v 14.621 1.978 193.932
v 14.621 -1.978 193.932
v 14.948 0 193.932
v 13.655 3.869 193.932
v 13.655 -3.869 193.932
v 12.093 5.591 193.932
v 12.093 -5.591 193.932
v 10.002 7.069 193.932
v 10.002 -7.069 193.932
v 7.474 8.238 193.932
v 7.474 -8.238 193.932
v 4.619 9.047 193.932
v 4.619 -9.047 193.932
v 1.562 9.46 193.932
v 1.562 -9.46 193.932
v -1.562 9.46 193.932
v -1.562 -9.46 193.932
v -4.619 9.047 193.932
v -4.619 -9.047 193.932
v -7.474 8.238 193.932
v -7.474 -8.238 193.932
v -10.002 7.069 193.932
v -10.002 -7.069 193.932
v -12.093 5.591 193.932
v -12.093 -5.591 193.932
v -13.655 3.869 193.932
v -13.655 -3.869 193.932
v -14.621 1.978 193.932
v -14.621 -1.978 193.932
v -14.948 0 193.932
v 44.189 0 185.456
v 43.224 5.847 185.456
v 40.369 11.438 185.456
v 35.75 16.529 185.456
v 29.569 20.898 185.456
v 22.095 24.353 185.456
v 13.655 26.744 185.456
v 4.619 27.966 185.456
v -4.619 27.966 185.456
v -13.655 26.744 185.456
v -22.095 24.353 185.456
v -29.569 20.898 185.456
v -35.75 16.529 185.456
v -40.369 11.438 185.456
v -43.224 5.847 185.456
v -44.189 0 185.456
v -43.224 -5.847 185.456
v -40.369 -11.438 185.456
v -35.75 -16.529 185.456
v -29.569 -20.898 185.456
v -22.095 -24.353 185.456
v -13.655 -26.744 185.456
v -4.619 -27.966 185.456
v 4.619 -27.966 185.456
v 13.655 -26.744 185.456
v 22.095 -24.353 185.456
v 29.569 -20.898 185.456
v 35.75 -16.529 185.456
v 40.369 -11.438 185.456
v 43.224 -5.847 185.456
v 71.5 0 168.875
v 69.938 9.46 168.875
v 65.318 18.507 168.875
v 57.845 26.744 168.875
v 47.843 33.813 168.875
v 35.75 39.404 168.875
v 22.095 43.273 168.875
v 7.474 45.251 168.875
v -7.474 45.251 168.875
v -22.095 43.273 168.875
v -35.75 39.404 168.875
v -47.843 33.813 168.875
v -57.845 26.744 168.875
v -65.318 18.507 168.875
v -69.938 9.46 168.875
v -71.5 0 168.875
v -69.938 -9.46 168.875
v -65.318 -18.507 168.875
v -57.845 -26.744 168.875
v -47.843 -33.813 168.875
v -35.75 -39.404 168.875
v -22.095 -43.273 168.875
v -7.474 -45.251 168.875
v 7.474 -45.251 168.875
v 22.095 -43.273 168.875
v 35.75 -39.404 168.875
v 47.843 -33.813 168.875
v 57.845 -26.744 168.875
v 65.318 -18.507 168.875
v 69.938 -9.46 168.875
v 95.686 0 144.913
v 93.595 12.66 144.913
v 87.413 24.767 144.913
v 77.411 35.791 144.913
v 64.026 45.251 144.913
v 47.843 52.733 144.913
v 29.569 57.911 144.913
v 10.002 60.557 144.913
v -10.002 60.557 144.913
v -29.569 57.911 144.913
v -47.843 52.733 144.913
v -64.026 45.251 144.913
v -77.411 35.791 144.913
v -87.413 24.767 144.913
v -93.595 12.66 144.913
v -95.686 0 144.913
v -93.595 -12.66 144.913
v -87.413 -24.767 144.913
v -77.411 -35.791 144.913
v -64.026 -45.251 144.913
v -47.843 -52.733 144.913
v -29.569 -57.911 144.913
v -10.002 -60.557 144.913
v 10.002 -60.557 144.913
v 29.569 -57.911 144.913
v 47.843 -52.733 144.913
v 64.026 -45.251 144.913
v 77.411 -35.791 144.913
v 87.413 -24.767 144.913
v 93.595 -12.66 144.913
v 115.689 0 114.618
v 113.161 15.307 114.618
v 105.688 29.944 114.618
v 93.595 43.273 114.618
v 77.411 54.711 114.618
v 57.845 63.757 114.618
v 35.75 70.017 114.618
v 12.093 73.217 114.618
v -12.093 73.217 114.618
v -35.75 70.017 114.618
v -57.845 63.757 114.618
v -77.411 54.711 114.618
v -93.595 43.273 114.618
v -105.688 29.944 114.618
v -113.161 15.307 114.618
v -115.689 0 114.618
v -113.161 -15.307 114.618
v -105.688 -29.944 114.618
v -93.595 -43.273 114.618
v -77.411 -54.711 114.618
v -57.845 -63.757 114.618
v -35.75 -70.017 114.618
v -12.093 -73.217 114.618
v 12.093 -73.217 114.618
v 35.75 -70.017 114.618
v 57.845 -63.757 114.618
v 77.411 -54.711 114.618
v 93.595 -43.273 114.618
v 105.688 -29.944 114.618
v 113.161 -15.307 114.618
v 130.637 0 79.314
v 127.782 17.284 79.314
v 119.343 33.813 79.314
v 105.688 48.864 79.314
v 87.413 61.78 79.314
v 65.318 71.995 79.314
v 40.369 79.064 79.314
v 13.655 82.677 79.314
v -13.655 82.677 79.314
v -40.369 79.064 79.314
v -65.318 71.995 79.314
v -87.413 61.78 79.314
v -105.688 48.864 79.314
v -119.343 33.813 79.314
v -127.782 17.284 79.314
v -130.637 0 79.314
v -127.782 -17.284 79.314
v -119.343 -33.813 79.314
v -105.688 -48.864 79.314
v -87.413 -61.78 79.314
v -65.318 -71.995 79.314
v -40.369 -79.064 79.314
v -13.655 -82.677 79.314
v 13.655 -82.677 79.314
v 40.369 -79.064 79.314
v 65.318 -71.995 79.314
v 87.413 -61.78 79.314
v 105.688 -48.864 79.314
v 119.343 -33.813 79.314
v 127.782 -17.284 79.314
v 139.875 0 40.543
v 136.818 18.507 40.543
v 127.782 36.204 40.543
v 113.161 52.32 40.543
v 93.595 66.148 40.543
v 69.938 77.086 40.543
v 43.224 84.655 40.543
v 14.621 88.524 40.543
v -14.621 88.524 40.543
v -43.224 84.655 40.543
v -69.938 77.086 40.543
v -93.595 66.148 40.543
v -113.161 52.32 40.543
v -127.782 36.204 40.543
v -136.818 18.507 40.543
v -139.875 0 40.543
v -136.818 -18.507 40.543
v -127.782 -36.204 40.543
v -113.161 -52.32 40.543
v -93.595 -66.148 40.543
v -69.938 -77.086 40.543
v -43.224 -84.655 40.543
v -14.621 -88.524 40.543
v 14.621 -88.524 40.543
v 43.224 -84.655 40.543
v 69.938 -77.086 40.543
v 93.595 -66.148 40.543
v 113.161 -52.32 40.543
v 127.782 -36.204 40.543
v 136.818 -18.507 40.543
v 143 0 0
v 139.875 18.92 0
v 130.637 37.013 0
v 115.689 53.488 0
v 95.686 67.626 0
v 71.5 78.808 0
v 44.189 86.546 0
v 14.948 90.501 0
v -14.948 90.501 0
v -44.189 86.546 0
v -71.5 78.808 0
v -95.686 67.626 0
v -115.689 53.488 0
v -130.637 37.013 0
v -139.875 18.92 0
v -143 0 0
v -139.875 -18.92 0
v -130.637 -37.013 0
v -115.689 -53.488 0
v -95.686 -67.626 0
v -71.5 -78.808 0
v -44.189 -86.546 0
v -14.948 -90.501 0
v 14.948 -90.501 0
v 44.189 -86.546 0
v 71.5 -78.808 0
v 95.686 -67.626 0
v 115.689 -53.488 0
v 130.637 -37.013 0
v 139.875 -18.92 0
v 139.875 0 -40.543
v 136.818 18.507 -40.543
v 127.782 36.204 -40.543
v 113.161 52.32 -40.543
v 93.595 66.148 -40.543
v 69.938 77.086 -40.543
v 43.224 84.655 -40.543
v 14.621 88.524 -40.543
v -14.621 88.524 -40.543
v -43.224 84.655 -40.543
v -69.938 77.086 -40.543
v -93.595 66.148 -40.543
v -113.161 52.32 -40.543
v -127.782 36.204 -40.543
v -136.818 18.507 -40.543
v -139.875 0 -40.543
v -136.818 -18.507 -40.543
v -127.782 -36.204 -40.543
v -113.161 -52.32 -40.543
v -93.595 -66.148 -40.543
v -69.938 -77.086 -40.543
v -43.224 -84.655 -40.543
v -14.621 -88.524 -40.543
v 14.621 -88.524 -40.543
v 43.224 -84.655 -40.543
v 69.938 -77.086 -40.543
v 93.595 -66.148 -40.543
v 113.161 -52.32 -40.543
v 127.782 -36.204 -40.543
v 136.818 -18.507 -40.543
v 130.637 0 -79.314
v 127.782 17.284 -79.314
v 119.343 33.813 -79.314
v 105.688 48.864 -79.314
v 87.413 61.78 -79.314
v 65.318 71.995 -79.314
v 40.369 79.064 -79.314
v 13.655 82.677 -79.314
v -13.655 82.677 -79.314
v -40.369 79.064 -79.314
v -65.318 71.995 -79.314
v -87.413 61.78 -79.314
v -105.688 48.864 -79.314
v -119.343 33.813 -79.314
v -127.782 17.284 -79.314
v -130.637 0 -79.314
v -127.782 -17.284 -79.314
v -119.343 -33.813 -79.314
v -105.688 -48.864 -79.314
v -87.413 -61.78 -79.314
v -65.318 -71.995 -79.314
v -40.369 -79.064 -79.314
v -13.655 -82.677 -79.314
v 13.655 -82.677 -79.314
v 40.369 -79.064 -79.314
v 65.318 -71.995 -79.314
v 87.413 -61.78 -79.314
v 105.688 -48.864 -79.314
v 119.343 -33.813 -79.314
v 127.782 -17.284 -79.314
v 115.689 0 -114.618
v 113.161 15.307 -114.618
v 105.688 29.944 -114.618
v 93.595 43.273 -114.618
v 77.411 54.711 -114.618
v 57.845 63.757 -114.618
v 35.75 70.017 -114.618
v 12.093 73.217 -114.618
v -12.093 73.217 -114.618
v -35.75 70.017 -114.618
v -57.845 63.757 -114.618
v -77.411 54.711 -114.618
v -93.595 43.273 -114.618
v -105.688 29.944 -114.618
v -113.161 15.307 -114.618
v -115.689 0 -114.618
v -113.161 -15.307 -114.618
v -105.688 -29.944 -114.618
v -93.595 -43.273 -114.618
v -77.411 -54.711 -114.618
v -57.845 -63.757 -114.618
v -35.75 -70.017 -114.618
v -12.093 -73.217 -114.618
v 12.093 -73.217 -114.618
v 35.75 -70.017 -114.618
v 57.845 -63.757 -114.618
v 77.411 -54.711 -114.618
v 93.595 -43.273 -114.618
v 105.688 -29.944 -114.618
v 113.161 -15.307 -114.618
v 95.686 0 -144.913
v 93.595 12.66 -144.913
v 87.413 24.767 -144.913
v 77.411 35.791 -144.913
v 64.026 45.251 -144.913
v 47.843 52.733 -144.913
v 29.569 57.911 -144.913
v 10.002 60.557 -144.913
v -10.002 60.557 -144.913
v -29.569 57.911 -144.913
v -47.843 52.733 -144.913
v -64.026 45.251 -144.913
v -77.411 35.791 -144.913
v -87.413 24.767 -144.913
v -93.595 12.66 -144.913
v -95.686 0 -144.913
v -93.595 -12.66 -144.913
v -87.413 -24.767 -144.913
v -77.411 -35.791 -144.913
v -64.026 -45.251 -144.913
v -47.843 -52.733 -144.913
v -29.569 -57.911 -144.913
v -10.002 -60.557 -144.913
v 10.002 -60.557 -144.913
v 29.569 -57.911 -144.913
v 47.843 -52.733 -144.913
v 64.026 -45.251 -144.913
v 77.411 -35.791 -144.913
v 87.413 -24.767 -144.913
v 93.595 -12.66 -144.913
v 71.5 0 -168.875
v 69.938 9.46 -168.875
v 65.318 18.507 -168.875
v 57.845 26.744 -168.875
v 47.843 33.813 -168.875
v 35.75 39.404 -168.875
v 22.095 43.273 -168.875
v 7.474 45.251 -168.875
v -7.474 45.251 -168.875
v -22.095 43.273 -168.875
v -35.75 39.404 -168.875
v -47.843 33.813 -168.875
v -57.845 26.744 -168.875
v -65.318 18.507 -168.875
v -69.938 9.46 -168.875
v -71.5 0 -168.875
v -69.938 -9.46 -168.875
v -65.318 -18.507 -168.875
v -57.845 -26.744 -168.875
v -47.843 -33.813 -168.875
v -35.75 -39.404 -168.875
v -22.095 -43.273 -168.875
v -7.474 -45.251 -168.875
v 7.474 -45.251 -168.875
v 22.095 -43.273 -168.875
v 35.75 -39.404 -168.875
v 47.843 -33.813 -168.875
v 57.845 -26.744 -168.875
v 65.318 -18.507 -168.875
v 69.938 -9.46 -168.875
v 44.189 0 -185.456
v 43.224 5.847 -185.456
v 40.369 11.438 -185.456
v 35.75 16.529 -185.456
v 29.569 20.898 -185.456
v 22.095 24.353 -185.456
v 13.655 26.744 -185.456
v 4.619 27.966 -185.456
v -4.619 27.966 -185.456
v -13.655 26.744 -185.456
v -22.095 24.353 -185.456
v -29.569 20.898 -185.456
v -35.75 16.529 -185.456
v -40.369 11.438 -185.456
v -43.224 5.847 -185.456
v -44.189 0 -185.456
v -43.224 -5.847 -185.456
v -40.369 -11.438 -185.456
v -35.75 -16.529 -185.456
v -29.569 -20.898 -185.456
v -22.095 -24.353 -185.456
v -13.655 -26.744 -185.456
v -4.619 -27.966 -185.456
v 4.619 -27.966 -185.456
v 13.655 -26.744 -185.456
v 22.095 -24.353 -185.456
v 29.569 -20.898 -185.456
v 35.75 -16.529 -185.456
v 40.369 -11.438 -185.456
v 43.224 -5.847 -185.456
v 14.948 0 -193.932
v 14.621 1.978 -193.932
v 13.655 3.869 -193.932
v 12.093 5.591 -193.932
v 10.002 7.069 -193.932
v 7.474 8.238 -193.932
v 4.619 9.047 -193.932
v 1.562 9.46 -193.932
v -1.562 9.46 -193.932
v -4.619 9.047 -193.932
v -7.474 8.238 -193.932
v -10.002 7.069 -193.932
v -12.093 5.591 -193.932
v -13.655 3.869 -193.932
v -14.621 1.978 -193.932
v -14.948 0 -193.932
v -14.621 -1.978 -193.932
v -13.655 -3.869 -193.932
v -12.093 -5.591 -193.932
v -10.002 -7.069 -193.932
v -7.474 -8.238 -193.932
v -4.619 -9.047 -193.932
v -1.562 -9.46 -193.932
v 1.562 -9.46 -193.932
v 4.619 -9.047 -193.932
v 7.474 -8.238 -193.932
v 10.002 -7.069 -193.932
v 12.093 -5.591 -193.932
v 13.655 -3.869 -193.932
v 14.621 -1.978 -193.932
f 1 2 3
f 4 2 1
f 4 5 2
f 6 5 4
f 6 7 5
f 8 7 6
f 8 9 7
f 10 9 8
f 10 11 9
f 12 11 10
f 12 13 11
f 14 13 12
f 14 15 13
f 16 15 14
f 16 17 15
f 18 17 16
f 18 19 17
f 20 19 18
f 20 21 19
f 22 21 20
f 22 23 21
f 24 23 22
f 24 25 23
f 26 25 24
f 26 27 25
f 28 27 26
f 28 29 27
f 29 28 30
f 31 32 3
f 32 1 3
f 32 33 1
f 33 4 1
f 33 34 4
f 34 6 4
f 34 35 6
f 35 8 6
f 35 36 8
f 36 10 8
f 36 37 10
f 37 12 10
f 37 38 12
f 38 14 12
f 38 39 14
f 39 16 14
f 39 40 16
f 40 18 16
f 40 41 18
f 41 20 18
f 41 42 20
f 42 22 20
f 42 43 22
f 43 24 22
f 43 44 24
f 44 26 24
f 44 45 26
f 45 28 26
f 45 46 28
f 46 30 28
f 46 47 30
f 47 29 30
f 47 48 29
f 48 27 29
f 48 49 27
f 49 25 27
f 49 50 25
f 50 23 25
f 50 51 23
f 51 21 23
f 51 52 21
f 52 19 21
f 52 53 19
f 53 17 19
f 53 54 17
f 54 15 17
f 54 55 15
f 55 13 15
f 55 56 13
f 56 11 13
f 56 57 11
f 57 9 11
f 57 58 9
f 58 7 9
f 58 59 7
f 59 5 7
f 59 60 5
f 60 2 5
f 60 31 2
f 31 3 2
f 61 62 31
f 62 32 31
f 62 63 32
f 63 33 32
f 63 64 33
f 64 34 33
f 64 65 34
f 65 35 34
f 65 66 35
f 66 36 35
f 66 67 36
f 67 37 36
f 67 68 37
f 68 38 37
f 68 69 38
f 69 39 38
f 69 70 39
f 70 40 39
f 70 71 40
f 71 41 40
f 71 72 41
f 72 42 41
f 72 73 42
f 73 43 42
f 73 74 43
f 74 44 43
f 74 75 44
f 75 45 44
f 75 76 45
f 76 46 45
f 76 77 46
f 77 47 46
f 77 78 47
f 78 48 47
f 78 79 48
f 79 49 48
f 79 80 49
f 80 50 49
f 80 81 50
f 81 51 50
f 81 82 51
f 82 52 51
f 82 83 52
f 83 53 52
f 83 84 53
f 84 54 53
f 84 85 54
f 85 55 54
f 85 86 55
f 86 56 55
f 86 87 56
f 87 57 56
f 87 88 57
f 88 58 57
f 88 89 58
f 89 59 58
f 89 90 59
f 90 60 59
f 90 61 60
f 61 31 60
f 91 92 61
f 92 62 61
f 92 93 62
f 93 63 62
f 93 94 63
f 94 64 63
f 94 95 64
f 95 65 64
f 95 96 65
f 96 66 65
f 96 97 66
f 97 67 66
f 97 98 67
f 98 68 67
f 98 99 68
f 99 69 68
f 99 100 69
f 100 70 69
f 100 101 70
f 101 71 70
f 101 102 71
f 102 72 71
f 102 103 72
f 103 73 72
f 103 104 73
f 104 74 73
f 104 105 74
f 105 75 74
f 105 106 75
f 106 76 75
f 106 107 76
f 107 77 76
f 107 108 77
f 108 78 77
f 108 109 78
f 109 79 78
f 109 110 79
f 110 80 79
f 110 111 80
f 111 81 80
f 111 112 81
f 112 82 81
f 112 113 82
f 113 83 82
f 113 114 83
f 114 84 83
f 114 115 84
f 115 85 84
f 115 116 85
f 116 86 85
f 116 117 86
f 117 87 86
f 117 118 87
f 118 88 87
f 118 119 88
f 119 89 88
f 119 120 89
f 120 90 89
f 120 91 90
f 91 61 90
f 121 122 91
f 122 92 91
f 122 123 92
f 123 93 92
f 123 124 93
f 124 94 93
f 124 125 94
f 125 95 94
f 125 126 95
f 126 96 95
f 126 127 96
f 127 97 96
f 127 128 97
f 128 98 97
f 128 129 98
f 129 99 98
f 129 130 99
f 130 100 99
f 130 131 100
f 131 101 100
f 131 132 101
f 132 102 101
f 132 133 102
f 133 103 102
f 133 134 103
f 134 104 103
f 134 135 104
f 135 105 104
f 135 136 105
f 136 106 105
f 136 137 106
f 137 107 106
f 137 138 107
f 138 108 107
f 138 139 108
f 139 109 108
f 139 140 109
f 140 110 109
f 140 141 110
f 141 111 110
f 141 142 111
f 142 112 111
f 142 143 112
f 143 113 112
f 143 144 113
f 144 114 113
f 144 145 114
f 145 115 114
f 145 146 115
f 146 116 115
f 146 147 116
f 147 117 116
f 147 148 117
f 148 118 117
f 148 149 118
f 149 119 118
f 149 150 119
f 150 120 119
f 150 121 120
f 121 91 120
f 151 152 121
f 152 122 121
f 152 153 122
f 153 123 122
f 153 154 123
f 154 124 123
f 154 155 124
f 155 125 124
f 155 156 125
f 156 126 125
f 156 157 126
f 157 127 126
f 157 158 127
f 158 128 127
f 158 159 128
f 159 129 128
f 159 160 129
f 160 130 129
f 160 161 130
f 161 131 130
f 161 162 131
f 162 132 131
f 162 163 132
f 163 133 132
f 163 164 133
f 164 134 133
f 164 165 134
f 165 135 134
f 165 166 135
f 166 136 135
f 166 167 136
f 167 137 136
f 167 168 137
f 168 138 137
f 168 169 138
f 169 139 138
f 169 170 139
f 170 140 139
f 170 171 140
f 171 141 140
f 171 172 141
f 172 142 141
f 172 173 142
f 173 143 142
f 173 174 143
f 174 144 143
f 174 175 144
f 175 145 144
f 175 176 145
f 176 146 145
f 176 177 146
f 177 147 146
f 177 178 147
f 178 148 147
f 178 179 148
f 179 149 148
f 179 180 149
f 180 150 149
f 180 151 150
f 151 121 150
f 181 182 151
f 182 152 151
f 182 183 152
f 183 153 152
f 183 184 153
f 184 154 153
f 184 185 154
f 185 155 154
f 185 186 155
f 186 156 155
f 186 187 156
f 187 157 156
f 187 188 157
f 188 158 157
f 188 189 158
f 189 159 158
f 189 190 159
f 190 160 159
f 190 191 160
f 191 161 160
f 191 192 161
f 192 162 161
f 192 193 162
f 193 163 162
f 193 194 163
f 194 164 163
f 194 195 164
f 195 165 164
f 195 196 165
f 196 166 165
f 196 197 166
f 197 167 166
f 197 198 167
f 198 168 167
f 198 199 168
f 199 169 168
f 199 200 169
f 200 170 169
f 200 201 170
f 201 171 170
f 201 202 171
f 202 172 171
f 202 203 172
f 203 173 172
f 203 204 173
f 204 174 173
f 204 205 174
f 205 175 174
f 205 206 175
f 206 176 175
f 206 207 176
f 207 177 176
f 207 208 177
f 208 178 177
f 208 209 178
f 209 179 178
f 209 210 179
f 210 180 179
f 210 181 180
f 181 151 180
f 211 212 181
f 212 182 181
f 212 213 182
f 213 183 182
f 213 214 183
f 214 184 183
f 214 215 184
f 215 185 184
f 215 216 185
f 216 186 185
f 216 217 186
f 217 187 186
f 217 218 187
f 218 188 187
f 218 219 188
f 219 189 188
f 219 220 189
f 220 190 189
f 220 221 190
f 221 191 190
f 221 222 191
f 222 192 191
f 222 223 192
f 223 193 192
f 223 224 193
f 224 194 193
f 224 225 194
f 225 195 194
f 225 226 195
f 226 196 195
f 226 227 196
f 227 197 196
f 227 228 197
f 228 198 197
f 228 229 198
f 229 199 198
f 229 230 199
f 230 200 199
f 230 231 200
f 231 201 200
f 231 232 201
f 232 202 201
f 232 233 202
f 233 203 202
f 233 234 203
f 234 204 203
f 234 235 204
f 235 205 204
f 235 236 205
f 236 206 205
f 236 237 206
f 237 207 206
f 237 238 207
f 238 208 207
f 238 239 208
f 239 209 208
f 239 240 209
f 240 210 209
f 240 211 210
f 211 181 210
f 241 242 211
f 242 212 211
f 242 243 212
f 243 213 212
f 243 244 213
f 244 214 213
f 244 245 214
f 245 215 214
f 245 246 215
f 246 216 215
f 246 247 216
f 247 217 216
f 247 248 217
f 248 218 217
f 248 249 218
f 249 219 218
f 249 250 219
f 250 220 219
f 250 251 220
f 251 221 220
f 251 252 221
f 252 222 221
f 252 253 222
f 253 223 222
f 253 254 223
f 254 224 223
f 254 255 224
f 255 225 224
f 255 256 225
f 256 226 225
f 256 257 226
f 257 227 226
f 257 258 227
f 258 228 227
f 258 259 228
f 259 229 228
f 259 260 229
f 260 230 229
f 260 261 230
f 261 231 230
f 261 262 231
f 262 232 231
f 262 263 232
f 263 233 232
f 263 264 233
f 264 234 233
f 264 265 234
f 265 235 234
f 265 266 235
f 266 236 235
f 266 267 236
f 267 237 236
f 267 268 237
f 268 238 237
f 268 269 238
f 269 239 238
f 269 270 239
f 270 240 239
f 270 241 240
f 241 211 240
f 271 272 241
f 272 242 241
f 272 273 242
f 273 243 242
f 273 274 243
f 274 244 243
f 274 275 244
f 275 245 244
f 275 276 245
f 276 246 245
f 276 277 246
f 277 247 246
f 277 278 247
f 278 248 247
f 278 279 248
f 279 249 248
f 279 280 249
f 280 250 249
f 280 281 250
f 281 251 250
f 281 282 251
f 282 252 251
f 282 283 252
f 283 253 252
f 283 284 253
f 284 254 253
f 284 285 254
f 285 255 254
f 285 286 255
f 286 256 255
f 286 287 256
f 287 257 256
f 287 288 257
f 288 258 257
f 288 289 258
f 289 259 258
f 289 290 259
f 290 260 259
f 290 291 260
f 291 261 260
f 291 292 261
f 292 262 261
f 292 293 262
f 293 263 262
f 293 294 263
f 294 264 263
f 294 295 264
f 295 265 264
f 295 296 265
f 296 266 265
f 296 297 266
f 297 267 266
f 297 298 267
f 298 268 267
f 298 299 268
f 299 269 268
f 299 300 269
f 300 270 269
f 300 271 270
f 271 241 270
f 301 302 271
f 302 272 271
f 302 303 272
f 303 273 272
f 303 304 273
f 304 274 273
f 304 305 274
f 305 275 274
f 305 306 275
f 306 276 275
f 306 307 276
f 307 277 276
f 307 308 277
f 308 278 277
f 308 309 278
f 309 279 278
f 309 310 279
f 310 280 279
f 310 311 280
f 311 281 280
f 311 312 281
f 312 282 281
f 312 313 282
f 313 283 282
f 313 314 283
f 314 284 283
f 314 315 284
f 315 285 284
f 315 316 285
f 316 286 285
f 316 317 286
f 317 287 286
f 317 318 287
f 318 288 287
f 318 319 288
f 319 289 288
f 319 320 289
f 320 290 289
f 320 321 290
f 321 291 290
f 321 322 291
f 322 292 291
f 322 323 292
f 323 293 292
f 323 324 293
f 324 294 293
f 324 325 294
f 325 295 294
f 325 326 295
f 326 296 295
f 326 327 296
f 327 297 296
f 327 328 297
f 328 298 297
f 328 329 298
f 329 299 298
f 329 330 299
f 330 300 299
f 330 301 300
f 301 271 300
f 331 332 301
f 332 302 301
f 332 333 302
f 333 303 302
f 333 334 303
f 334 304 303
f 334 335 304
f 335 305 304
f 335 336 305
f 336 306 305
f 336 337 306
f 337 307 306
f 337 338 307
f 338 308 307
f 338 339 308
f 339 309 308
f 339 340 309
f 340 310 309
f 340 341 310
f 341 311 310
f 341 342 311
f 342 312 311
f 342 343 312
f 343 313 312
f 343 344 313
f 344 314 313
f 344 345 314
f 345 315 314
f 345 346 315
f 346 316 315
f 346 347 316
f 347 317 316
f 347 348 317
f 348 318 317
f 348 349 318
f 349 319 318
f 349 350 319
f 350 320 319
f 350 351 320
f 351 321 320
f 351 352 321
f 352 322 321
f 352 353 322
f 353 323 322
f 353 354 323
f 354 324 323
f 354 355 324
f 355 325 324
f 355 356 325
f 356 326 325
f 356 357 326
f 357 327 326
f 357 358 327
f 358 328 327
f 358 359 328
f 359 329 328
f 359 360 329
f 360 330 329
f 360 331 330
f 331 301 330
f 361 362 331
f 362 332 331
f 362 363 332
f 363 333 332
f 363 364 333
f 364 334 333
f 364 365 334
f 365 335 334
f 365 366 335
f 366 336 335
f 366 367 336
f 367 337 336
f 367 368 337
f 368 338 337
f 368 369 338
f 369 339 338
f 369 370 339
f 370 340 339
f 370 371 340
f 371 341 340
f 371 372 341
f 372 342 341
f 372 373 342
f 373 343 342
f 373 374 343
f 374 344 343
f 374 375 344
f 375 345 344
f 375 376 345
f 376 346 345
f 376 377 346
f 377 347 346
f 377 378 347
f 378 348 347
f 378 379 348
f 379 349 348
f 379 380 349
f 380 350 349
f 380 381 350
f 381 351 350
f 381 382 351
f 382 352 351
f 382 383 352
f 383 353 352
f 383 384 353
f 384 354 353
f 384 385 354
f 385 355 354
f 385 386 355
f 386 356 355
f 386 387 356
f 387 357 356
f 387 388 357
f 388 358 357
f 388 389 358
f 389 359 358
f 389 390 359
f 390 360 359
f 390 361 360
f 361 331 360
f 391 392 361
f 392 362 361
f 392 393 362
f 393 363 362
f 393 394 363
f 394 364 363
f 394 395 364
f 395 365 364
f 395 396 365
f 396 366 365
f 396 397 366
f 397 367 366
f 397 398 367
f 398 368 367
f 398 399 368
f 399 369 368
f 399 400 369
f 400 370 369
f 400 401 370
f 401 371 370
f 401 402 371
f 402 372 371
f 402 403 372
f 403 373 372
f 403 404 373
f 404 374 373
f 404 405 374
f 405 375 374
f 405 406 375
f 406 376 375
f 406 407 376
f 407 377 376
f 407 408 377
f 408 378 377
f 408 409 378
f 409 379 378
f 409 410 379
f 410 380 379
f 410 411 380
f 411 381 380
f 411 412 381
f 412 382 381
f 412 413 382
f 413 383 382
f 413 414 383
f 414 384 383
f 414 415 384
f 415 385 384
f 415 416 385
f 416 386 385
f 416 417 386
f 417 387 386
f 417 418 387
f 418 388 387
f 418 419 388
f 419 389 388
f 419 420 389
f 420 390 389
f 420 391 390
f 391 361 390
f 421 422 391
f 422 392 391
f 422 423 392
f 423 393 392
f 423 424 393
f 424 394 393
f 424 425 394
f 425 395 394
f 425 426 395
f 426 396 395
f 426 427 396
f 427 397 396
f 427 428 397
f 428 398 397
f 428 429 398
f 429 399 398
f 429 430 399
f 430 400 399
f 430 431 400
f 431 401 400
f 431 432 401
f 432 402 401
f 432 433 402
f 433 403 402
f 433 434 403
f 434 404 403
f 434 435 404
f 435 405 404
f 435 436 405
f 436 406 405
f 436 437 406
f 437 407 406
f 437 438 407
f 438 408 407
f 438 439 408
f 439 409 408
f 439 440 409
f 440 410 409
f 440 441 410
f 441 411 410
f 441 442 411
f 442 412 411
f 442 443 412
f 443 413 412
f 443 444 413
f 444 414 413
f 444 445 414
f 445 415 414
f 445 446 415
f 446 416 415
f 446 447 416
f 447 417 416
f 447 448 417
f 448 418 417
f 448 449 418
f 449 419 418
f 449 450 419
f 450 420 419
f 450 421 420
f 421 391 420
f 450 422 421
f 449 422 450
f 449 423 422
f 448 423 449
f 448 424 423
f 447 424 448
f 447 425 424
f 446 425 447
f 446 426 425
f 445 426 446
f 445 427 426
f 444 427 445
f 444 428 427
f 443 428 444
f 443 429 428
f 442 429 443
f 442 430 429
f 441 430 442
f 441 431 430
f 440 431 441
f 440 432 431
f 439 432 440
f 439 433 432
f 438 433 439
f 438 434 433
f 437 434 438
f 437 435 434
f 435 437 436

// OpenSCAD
// Generated by SolidPython 1.0.1 on 2020-07-29 00:46:49


scale(v = [11, 7, 15]) {
	sphere(r = 13);
}
/***********************************************
*********      SolidPython code:      **********
************************************************
 
# import packages: SolidPython
from solid import *
from solid.utils import *
from itertools import chain, combinations, permutations


class Resize:

    def __init__(self, scad_file):
        self.scad_file = scad_file
        #self.scad_file = import_scad(scad_file)
        # cone/cylinder param:
        self.r1 = 0
        self.r2 = 0
        self.h = 0
        # rectangular prism param:
        self.w = 0
        self.l = 0
        # ellipse param:
        self.r = 0

    # import OpenScad code (file name corresponds to shape)


    # classify shape + parameters
    def assign(self, param1, param2, param3):
        if self.scad_file == 'cone.scad':
            self.r1 = param1
            self.r2 = param2
            self.h = param3
        elif self.scad_file == 'cylinder.scad':
            self.r1 = param1
            self.r2 = param2
            self.h = param3
        elif self.scad_file == 'rectangularPrism.scad':
            self.h = param1
            self.l = param2
            self.w = param3
        else:
            self.r = param1
            self.h = param2

    # resize parameters
    def iterate(self):
        x = range(3, 20, 2)
        i = 1
        if self.scad_file == 'cone.scad':
            tempList = list(permutations(x, 2))
            for temp in tempList:
                param1 = temp[0]
                param2 = temp[1]
                filepath = 'produced_scad_files/' + 'cone' + str(param1) + '_' + str(param2) + '_' + '.scad'
                scad_render_to_file(cylinder(h=param1, r1=param2, r2=0), filepath)

        elif self.scad_file == 'cylinder.scad':
            tempList = list(permutations(x, 3))
            for temp in tempList:
                param1 = temp[0]
                param2 = temp[1]
                filepath = 'produced_scad_files/' + 'cylinder' + str(param1) + '_' + str(param2) + '_' + '.scad'
                scad_render_to_file(cylinder(h=param1, r1=param2, r2=param2), filepath)

        elif self.scad_file == 'rectangularPrism.scad':
            tempList = list(permutations(x, 3))
            for temp in tempList:
                param1 = temp[0]
                param2 = temp[1]
                param3 = temp[2]
                filepath = 'produced_scad_files/' + 'rectangularPrism' + str(param1) + '_' + str(param2) + '_' + str(
                    param3) + '.scad'
                scad_render_to_file(cube(size=(param1, param2, param3)), filepath)

        elif self.scad_file == 'ellipse.scad':
            tempList = list(permutations(x, 4))
            for temp in tempList:
                param1 = temp[0]
                param2 = temp[1]
                param3 = temp[2]
                param4 = temp[3]
                filepath = 'produced_scad_files/' + 'ellipse' + str(param1) + '_' + str(param2) + '_' + str(param3) + '_' + str(param4) + '.scad'
                scad_render_to_file(scale([param1, param2, param3])(sphere(r=param4)), filepath)

    def render_to_scadfile(self):
        scad_render_to_file(scad, 'example.scad') 
 
************************************************/
